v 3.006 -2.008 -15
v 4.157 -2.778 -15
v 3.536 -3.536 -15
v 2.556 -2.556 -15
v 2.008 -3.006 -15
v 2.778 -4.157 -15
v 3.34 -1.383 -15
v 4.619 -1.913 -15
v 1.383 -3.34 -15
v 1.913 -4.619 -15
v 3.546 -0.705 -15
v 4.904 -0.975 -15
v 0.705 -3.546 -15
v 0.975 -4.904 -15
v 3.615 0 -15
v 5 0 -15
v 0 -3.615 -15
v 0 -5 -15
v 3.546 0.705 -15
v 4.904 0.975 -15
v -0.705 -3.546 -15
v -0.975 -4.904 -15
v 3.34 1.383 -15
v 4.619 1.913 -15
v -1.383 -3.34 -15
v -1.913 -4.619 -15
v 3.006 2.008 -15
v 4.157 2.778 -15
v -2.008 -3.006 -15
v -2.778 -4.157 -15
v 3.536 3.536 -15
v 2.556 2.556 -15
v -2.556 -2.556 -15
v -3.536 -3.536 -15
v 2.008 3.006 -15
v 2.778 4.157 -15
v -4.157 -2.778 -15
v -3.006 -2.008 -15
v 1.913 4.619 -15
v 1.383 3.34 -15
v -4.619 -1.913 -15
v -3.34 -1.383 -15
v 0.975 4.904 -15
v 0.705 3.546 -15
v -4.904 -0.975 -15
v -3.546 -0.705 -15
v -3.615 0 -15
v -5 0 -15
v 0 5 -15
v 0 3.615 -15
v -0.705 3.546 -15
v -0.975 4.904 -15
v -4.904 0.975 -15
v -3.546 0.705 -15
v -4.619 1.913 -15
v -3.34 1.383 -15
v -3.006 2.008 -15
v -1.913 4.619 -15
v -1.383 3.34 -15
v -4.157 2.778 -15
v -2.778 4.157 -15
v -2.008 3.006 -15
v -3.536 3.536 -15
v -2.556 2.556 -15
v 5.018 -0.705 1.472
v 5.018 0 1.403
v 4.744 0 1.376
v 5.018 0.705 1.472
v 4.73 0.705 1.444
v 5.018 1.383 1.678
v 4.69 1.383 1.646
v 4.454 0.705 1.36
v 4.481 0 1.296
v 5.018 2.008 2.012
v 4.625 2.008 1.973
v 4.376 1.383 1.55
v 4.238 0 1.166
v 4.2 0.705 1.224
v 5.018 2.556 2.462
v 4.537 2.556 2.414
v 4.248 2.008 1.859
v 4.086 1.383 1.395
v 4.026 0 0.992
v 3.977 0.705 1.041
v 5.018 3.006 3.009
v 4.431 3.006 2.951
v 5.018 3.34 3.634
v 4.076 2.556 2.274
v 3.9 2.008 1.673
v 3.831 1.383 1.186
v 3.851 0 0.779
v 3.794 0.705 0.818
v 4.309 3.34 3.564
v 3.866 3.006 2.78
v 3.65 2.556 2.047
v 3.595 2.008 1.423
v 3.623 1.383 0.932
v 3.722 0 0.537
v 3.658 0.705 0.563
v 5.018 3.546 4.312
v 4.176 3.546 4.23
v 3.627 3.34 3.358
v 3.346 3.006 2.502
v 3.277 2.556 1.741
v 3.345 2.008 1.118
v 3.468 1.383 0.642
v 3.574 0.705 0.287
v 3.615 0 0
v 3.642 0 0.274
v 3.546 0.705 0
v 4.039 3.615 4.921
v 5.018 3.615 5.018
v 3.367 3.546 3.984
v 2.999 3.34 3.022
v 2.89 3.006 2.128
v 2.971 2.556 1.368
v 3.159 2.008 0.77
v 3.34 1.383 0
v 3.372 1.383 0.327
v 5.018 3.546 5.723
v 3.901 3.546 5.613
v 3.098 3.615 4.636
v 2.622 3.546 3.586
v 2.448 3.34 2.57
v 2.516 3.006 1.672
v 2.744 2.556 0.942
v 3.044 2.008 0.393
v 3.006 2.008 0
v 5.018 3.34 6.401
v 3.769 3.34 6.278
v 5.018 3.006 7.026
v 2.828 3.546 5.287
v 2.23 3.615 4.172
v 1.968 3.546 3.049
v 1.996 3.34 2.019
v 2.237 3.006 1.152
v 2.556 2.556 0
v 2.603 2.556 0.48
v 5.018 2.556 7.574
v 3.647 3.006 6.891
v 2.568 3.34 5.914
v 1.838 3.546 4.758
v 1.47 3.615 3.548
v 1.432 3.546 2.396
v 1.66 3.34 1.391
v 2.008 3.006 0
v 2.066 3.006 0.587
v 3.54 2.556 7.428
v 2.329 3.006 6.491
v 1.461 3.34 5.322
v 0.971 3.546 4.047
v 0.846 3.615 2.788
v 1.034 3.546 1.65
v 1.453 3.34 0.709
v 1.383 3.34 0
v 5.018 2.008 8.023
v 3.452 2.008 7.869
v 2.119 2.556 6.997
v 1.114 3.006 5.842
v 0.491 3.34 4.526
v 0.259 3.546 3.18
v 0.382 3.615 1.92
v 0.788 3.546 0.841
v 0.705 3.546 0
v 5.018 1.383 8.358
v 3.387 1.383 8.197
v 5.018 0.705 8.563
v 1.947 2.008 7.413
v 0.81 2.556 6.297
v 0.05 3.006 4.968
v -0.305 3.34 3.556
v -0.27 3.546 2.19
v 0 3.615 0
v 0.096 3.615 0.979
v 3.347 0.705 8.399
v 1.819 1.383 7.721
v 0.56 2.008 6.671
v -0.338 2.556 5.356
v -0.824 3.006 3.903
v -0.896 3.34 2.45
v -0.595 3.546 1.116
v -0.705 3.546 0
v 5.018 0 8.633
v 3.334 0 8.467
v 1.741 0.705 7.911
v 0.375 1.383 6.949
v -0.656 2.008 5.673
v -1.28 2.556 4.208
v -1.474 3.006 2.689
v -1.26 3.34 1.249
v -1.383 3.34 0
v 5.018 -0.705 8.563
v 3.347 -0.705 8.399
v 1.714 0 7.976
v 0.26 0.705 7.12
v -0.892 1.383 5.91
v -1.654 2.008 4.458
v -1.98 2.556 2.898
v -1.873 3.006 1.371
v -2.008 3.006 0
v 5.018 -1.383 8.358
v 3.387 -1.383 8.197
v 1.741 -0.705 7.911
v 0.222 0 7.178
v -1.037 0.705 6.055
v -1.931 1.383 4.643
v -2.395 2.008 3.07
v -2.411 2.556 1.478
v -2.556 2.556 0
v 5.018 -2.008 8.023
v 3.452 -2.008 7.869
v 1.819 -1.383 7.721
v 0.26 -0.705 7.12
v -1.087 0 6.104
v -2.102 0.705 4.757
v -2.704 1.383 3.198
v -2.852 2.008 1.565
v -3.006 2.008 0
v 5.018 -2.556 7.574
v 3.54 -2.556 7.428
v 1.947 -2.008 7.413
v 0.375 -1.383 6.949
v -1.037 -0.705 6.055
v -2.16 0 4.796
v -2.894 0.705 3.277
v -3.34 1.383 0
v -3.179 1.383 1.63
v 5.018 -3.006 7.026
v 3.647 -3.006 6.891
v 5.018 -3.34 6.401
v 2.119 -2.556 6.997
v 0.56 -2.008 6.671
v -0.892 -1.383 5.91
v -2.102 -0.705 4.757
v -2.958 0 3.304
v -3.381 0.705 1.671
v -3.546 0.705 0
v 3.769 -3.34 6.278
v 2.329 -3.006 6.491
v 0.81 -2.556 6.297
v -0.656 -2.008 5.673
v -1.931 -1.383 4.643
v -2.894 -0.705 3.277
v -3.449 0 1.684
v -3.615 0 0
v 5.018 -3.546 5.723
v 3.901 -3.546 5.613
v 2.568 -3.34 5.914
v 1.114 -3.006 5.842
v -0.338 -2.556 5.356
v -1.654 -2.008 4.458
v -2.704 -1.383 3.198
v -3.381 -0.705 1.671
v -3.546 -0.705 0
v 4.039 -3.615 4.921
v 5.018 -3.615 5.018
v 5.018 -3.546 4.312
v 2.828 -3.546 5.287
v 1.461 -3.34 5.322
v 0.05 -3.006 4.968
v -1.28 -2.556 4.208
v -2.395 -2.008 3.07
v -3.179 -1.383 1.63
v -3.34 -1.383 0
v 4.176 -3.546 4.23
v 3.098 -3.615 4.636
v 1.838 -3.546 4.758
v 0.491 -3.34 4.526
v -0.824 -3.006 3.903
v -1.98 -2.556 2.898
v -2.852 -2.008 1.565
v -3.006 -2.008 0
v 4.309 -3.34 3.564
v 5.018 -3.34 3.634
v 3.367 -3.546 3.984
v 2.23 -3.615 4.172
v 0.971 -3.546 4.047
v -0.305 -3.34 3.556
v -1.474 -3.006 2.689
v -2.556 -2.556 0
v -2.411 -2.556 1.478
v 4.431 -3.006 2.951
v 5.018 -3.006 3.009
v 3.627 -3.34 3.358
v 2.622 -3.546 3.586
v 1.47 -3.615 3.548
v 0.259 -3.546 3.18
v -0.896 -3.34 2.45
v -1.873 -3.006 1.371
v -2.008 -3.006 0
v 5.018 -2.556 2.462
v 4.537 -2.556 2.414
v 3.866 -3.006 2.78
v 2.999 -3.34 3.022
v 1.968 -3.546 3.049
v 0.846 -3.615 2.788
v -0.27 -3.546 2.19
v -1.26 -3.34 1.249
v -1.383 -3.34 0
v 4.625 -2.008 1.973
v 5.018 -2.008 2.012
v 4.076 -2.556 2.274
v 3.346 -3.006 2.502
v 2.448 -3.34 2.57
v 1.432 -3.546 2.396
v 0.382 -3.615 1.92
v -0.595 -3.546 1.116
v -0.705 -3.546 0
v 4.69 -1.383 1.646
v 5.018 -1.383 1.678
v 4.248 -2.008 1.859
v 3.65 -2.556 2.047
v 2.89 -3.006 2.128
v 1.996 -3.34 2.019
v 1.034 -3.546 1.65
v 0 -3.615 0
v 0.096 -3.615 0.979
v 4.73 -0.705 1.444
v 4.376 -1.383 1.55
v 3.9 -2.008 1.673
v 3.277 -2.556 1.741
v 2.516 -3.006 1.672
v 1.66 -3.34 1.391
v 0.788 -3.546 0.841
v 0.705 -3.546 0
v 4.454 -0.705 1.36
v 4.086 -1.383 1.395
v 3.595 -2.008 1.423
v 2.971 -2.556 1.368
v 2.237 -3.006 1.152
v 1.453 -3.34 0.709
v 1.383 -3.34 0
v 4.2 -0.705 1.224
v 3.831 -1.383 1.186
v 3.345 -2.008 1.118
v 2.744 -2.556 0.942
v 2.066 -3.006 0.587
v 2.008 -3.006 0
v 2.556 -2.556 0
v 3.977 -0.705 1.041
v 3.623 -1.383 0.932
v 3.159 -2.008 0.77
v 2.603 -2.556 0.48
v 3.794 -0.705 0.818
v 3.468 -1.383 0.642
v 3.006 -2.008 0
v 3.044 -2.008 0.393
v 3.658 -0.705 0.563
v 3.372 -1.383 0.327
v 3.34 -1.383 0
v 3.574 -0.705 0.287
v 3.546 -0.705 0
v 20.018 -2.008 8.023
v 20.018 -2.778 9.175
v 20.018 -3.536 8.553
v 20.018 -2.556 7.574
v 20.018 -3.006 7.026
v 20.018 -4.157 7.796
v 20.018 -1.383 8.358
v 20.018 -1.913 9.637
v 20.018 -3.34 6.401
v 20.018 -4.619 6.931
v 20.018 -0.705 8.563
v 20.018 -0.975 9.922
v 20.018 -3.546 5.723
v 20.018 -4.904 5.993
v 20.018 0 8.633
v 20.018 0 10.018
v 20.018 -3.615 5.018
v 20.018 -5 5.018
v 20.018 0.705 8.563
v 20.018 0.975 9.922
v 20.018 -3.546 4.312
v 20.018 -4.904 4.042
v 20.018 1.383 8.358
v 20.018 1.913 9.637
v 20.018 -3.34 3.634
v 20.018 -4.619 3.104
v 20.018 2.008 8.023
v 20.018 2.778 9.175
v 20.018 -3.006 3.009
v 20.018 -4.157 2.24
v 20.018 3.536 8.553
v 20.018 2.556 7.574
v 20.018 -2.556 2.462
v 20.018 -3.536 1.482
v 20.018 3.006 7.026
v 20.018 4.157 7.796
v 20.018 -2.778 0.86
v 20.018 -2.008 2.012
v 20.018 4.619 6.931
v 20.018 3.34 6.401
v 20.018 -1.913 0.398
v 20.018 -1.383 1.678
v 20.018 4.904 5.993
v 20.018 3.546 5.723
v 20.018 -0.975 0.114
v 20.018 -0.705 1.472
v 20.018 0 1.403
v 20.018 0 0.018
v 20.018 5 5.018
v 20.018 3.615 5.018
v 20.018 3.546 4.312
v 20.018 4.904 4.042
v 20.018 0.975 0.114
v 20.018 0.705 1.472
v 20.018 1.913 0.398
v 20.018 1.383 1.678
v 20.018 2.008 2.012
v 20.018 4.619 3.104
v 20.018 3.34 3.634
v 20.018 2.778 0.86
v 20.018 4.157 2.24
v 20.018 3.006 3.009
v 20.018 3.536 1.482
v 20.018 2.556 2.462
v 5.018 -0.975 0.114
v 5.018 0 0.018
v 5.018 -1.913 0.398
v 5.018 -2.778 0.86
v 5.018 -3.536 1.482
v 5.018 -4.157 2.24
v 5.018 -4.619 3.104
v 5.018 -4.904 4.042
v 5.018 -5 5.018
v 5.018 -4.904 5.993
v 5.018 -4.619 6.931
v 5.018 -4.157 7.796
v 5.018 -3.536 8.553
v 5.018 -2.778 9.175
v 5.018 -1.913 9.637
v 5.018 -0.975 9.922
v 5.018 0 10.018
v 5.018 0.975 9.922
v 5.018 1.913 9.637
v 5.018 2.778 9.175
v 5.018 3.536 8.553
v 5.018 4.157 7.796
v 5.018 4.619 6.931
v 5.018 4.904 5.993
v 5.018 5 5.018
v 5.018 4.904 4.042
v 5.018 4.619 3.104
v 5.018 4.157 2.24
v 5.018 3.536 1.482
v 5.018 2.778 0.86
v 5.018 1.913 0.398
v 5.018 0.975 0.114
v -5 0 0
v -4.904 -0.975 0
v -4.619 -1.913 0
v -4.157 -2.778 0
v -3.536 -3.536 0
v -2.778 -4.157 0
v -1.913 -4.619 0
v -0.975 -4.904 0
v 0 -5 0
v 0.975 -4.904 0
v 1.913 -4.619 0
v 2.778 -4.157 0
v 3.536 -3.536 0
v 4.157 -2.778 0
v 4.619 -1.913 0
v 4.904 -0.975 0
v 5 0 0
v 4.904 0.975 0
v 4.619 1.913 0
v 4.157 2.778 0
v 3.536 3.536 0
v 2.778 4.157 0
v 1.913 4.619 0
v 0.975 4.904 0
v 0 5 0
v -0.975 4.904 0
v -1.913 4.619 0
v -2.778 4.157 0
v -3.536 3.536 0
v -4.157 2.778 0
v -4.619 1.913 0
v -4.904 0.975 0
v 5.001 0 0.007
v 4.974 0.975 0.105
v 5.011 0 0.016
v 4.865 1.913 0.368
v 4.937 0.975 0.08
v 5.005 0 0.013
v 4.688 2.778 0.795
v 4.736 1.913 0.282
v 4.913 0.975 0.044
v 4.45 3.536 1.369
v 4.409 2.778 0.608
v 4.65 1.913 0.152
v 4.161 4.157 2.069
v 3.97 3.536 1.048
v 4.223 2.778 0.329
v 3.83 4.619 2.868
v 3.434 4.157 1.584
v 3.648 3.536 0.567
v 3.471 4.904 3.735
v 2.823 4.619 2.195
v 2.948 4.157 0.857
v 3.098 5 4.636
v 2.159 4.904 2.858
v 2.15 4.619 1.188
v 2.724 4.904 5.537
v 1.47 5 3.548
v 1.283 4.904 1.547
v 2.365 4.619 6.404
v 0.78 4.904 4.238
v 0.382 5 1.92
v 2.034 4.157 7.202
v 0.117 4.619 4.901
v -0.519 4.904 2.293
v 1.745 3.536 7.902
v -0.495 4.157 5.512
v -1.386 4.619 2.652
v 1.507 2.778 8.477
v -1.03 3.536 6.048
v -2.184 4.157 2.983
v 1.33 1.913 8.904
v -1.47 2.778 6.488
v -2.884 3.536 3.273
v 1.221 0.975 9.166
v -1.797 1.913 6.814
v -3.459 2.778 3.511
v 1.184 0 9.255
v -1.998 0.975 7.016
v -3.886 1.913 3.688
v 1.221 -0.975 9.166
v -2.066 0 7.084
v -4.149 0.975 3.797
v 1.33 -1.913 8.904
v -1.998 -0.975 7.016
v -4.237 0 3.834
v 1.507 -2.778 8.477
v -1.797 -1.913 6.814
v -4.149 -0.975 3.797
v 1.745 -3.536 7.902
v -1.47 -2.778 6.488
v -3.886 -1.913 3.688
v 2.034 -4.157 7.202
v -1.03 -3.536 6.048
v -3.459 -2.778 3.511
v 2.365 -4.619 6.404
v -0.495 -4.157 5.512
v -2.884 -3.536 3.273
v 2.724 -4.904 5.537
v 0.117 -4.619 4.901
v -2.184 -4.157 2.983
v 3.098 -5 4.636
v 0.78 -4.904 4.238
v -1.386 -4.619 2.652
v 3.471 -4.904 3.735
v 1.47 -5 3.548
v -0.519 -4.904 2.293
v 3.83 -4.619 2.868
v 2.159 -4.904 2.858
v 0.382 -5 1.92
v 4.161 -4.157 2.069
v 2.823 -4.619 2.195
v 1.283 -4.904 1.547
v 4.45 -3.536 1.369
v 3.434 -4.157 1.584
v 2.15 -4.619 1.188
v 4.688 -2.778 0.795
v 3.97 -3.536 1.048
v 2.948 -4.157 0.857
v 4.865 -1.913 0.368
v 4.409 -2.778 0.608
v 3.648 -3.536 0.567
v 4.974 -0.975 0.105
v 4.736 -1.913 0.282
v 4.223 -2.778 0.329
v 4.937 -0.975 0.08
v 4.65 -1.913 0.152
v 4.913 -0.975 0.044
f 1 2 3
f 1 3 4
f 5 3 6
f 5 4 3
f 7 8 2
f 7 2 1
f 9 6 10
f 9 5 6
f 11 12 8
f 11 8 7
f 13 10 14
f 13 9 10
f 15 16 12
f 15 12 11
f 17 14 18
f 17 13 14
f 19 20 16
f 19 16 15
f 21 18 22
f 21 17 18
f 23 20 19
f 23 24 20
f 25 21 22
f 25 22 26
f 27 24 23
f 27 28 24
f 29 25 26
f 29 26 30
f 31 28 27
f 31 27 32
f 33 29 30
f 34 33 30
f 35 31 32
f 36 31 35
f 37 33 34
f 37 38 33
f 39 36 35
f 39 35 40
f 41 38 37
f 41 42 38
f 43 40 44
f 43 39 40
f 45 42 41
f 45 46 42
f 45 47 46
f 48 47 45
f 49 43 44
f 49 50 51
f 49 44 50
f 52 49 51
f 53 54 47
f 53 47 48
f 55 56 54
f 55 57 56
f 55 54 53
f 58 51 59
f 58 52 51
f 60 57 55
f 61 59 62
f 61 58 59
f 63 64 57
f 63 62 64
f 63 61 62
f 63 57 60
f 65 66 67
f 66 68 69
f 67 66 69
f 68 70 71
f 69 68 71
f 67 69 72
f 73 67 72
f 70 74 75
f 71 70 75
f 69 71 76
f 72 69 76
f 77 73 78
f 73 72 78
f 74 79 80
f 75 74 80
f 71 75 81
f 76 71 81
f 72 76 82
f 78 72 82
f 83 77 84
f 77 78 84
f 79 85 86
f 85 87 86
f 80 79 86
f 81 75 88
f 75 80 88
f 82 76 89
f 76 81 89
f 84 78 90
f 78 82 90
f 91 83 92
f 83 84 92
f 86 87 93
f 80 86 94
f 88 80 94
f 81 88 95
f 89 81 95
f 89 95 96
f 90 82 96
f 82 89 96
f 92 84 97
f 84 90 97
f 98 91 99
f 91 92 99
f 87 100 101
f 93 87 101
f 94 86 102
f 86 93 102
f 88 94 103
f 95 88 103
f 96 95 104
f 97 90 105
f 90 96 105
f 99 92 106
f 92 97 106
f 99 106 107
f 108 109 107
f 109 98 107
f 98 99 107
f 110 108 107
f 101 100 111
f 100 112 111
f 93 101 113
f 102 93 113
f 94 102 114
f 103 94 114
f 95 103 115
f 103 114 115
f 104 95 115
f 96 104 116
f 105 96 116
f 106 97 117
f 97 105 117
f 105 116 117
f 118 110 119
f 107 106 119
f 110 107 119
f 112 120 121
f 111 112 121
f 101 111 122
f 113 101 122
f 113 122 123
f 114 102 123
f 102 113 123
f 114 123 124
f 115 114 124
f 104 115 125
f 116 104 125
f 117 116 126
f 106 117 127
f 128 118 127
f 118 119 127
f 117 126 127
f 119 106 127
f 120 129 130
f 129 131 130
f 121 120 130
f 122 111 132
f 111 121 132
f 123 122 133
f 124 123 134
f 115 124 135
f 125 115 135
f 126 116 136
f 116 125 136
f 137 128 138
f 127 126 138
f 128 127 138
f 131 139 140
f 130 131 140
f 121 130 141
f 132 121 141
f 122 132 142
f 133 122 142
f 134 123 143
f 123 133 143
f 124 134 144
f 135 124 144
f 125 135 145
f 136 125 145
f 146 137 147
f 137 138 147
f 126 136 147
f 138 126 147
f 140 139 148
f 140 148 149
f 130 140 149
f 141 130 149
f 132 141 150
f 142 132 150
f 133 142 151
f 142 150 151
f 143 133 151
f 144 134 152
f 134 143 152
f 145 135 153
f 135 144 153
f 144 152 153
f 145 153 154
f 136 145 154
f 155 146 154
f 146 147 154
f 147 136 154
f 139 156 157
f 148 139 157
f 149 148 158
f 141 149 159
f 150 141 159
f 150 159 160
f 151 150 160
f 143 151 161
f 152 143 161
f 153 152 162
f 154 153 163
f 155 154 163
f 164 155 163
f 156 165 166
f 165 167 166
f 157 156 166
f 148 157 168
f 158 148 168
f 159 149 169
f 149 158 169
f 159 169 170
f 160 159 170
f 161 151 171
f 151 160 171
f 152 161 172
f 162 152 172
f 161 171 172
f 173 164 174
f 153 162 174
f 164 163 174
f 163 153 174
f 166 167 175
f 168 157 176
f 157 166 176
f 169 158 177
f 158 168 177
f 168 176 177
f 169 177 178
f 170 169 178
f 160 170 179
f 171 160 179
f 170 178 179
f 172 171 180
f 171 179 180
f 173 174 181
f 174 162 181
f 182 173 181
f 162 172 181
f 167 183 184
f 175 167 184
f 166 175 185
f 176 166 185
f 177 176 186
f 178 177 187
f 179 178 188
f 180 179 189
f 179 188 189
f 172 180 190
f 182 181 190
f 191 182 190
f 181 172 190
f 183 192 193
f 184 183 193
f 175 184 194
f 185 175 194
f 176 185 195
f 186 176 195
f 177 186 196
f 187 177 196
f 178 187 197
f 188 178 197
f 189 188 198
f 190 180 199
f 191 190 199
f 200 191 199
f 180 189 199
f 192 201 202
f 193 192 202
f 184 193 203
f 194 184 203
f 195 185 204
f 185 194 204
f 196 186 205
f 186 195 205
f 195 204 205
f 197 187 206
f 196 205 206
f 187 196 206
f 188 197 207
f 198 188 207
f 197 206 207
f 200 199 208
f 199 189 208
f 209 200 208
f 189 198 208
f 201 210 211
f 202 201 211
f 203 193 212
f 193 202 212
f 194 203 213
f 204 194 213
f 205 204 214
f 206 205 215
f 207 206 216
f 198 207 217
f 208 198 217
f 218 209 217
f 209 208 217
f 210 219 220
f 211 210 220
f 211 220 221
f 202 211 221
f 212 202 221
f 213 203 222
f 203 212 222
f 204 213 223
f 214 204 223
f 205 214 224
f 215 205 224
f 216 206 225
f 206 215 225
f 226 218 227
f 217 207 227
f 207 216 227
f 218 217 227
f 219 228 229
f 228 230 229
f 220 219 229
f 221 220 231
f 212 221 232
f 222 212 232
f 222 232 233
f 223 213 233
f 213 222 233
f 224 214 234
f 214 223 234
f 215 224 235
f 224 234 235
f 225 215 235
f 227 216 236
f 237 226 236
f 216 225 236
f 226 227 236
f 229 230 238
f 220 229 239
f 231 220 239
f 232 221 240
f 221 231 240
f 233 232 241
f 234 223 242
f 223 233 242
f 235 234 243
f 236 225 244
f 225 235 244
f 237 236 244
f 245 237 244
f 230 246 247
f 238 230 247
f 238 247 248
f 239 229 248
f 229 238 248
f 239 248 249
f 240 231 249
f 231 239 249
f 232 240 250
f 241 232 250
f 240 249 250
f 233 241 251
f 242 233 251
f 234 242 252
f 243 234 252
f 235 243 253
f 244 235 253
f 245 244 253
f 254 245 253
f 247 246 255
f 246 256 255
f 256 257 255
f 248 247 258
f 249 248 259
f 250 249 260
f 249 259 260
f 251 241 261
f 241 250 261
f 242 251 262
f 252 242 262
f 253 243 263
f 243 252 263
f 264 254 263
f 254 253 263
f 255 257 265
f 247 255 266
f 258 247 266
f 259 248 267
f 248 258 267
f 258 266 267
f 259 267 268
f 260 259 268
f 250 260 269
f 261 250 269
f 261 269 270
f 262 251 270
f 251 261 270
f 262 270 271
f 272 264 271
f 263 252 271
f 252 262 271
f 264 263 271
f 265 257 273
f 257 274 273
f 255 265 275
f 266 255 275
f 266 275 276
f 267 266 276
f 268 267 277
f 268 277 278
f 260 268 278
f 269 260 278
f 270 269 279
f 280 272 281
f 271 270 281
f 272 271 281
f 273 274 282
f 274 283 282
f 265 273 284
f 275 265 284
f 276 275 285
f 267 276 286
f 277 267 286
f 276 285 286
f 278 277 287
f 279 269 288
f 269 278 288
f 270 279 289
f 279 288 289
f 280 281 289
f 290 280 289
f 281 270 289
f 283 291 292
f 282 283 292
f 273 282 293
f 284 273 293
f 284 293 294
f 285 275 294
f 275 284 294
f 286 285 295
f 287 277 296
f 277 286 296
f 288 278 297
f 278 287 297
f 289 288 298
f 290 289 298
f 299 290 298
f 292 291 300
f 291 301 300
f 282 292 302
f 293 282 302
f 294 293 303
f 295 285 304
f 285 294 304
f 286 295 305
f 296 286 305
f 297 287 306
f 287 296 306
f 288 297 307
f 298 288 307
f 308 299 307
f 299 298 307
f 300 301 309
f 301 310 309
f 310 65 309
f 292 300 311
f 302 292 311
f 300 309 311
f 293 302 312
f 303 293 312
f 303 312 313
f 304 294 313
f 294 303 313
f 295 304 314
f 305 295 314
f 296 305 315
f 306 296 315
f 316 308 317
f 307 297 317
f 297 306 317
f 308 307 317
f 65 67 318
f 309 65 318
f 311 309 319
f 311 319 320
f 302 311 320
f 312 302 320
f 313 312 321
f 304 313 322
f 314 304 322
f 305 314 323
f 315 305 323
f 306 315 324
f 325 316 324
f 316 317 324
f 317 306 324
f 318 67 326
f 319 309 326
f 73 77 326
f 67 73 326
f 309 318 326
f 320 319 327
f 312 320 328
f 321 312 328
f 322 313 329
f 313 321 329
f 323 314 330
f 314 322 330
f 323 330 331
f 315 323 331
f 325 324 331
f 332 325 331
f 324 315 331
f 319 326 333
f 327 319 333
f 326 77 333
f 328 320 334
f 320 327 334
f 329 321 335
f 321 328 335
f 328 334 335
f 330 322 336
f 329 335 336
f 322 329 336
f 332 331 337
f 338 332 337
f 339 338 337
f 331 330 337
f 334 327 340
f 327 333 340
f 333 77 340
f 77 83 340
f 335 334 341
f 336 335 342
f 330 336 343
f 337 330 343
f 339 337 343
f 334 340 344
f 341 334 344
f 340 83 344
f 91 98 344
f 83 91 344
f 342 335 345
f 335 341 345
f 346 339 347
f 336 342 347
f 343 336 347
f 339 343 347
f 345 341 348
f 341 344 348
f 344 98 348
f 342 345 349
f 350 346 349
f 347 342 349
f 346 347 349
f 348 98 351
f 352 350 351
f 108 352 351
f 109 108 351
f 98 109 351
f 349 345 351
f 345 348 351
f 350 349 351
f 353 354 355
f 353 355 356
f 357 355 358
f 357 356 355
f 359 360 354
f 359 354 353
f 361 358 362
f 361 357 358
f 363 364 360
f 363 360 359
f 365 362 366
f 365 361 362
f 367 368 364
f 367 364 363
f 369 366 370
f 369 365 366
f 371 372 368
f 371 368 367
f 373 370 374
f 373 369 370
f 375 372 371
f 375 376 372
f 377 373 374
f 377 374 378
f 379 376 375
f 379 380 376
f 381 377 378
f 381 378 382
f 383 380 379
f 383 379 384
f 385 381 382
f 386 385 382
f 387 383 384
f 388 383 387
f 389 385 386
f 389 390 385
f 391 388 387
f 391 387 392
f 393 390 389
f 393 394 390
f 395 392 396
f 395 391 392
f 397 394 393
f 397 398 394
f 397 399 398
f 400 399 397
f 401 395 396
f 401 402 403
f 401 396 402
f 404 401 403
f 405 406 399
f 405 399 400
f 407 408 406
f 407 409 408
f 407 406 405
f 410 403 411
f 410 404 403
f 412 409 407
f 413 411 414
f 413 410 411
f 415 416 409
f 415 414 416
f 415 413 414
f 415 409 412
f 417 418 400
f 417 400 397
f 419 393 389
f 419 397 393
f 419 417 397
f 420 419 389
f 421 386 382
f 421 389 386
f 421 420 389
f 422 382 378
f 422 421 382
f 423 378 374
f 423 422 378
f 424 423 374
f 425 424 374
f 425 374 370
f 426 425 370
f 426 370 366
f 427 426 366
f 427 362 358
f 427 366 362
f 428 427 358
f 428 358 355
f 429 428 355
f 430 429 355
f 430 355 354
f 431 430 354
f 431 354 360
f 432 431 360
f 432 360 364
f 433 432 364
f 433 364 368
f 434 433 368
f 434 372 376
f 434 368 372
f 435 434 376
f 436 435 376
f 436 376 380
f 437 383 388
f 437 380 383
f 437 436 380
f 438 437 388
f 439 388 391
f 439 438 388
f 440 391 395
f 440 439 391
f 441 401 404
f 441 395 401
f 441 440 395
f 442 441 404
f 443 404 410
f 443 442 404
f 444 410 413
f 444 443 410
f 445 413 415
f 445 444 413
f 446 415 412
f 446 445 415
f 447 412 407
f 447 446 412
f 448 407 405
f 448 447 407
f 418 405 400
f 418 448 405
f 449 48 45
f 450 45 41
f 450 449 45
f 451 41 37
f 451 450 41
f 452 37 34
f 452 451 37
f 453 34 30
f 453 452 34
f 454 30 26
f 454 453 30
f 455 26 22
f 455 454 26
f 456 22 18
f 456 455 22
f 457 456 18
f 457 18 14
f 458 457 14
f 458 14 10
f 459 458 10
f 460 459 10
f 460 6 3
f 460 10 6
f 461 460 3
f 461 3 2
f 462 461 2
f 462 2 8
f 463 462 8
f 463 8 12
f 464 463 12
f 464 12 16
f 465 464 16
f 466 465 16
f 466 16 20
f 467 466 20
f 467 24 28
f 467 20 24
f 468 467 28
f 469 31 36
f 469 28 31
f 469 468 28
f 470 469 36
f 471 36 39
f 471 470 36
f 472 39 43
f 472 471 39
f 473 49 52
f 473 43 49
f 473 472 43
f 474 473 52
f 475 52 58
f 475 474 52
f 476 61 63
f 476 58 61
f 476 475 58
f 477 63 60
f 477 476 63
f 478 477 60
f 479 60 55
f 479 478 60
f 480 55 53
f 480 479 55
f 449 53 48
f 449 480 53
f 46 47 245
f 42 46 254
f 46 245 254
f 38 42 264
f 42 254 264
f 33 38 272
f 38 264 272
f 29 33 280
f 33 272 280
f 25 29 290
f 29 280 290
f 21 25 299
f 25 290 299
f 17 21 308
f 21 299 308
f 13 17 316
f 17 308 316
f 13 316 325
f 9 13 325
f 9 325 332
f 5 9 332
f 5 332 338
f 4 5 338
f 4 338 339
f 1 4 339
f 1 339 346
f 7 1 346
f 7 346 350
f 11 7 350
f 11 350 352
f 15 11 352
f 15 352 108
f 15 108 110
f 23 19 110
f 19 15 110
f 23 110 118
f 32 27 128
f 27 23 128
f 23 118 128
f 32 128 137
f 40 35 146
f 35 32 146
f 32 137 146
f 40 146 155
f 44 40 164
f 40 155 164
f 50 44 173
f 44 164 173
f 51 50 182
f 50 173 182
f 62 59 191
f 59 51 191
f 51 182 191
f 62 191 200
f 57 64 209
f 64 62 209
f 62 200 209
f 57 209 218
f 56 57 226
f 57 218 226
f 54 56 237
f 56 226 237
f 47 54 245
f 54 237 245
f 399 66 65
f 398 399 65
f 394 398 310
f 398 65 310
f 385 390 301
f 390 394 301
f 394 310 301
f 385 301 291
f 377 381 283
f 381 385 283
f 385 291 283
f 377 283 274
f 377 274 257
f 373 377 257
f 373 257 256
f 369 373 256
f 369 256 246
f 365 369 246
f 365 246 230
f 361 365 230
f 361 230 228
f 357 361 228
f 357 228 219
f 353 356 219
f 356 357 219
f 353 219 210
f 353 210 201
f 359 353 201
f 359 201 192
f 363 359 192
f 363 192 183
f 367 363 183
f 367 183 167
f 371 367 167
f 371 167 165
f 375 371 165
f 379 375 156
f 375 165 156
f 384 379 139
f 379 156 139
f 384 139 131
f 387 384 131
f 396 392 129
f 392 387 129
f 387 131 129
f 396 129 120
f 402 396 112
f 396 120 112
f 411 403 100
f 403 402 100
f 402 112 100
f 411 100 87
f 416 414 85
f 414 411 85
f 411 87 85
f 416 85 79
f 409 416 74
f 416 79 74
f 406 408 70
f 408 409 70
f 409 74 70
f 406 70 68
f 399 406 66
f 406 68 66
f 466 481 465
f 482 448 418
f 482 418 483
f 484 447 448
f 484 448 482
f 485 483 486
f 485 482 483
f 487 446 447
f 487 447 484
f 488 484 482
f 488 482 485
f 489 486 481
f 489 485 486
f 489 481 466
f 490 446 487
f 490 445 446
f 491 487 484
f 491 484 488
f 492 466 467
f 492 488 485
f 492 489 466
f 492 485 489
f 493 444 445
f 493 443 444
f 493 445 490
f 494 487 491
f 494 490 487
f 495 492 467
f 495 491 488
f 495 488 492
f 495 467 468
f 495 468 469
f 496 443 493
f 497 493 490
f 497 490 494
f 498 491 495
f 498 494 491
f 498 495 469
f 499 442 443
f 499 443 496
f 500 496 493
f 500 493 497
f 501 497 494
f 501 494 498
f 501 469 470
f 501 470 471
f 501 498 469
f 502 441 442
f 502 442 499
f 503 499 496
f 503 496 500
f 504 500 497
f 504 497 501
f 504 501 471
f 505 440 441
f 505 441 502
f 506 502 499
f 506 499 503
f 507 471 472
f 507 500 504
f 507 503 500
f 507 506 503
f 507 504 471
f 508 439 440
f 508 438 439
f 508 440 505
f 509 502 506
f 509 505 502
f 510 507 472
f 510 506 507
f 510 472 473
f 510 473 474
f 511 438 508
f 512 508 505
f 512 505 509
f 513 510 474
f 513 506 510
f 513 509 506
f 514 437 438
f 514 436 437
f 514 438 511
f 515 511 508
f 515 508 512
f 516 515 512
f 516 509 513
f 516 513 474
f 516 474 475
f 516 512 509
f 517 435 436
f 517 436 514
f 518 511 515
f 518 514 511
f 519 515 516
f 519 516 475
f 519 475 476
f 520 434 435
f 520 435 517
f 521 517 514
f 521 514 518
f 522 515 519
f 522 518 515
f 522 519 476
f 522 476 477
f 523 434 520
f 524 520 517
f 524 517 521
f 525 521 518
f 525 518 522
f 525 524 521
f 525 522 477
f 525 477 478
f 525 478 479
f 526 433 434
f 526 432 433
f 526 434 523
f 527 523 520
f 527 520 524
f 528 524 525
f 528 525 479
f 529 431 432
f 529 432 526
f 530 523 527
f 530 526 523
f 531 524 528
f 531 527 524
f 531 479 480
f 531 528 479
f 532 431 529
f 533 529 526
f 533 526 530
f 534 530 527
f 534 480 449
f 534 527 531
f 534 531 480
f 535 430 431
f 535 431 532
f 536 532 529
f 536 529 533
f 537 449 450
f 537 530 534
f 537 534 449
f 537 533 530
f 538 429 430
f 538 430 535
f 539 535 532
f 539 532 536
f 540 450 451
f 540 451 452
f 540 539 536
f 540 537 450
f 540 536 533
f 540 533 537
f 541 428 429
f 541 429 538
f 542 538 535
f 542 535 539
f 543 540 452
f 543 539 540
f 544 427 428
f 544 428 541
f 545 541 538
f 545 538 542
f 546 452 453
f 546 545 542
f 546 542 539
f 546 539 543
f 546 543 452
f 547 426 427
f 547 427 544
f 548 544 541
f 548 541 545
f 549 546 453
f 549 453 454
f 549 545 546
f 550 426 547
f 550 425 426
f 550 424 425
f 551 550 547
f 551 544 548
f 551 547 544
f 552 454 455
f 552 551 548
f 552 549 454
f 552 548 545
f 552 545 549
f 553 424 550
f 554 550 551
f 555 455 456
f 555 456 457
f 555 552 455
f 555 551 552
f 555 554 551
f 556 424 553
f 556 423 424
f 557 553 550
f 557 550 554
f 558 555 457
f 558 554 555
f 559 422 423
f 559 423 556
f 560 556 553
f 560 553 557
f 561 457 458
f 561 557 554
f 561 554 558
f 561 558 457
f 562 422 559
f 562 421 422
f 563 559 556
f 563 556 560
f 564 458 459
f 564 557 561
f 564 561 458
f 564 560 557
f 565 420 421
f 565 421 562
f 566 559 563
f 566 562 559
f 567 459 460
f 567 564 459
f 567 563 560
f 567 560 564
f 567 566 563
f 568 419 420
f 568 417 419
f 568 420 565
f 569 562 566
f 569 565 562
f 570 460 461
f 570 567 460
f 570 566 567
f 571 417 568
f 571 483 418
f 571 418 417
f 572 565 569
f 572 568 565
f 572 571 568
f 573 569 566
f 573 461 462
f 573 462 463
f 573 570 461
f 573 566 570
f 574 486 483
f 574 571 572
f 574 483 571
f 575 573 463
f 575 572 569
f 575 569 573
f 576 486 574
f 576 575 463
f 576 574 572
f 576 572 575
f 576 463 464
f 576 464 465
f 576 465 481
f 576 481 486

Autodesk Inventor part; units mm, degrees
ref_plane "YZ Plane" through (0, 0, 0) normal (1, 0, 0) x (0, 1, 0)
ref_plane "XZ Plane" through (0, 0, 0) normal (0, 1, 0) x (-1, 0, 0)
ref_plane "XY Plane" through (0, 0, 0) normal (0, 0, 1) x (1, 0, 0)
sketch "Sketch1" plane through (0, 0, 0) normal (0, 0, 1) x (1, 0, 0)
  circle A0 centre (0, 0) radius 3.615
  circle A1 centre (0, 0) radius 5
  dimension "d0" = 7.23
  dimension "d1" = 10
sketch "Sketch2" plane through (0, 0, 0) normal (0, 0, 1) x (1, 0, 0)
  line L0 (5.0177, 0) -> (5.0177, 4.7273)
  line L1 (5.0177, 0) -> (9.745, 0) construction
  line L2 (5.0177, 4.7273) -> (5.0177, -3.9213)
  point P0 (0, 0)
  dimension "d2" = 90
revolve "Revolution1" add sketch "Sketch1" angle 90 about axis through (5.0177, 0, 0) along (0, 1, 0)
sketch "Sketch3" plane through (5.0177, 0, 5.0177) normal (1, 0, 0) x (0, 0, -1)
  point P0 (5.0177, 0)
sketch "Sketch4" plane through (5.0177, 0, 5.0177) normal (1, 0, 0) x (0, 0, -1)
  circle A0 centre (0, 0) radius 3.615
  circle A1 centre (0, 0) radius 5
  point P0 (5.0177, 0)
  dimension "d4" = 7.23
  dimension "d5" = 10
extrude "Extrusion1" add sketch "Sketch4" along normal blind 15
sketch "Sketch5" plane through (0, 0, 0) normal (0, 0, -1) x (-1, 0, 0)
  circle A0 centre (0, 0) radius 3.615
  circle A1 centre (0, 0) radius 5
  dimension "d8" = 7.23
  dimension "d9" = 10
extrude "Extrusion2" add sketch "Sketch5" along normal blind 15
properties part number "Knee-big"
